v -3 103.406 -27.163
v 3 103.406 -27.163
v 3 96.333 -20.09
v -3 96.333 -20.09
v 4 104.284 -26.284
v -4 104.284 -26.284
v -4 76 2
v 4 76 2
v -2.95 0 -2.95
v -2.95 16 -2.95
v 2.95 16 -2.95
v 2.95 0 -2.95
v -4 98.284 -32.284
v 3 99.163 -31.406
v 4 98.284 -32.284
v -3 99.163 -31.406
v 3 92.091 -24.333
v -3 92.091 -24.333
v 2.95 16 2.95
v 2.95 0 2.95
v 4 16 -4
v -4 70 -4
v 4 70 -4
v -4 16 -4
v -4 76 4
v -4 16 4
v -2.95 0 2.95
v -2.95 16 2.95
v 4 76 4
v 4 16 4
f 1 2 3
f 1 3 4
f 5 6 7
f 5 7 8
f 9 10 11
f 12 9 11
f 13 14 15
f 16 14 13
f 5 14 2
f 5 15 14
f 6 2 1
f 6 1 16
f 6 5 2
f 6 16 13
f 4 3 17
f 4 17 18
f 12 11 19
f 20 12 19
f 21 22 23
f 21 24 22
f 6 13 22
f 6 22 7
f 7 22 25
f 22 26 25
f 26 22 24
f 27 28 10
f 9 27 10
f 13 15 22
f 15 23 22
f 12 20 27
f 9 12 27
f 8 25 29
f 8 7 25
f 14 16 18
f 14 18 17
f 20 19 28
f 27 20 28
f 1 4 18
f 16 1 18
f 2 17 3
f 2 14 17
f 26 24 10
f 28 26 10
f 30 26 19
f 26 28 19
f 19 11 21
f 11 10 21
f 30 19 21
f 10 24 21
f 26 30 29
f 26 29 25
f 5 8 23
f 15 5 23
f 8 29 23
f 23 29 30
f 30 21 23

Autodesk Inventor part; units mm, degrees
ref_plane "YZ Plane" through (0, 0, 0) normal (1, 0, 0) x (0, 1, 0)
ref_plane "XZ Plane" through (0, 0, 0) normal (0, 1, 0) x (-1, 0, 0)
ref_plane "XY Plane" through (0, 0, 0) normal (0, 0, 1) x (1, 0, 0)
sketch "Sketch1" plane through (0, 0, 0) normal (0, 1, 0) x (-1, 0, 0)
  line L0 (-2.95, 2.95) -> (2.95, 2.95)
  line L1 (2.95, 2.95) -> (2.95, -2.95)
  line L2 (2.95, -2.95) -> (-2.95, -2.95)
  line L3 (-2.95, -2.95) -> (-2.95, 2.95)
  line L4 (-2.95, 2.95) -> (2.95, -2.95) construction
  line L5 (2.95, 2.95) -> (-2.95, -2.95) construction
  point P0 (0, 0)
  dimension "d0" = 5.9
  dimension "d1" = 5.9
extrude "Extrusion1" add sketch "Sketch1" along normal blind 16
sketch "Sketch2" plane through (0, 16, 0) normal (0, 1, 0) x (1, 0, 0)
  line L0 (4, -4) -> (-4, -4)
  line L1 (-4, -4) -> (-4, 4)
  line L2 (-4, 4) -> (4, 4)
  line L3 (4, 4) -> (4, -4)
  line L4 (4, -4) -> (-4, 4) construction
  line L5 (-4, -4) -> (4, 4) construction
  point P0 (0, 0)
  dimension "d4" = 8
  dimension "d5" = 8
extrude "Extrusion2" add sketch "Sketch2" along normal blind 60
chamfer "Chamfer1" distance 6 angle 45 1 edges at (0, 76, -4) measured on face at (1.3333, 76, 1.3333)
sketch "Sketch4" plane through (4, 76, 2) normal (0, 0.7071, -0.7071) x (-1, 0, 0)
  line L0 (8, -8.4853) -> (8, 0) projected
  line L1 (8, 0) -> (0, 0) projected
  line L2 (0, 0) -> (0, -8.4853) projected
  line L3 (0, -8.4853) -> (8, -8.4853) projected
  point P0 (4, -55.1543)
extrude "Extrusion4" add sketch "Sketch4" along normal blind 40
sketch "Sketch5" plane through (4, 104.2843, -26.2843) normal (0, 0.7071, -0.7071) x (-1, 0, 0)
  line L0 (8, -8.4853) -> (8, 0) projected
  line L1 (8, 0) -> (0, 0) projected
  line L2 (0, 0) -> (0, -8.4853) projected
  line L3 (0, -8.4853) -> (8, -8.4853) projected
  line L4 (7, -7.2426) -> (1, -7.2426)
  line L5 (1, -7.2426) -> (1, -1.2426)
  line L6 (1, -1.2426) -> (7, -1.2426)
  line L7 (7, -1.2426) -> (7, -7.2426)
  line L8 (7, -7.2426) -> (1, -1.2426) construction
  line L9 (1, -7.2426) -> (7, -1.2426) construction
  point P0 (4, -55.1543)
  point P1 (4, -4.2426)
  dimension "d15" = 6
  dimension "d16" = 6
extrude "Extrusion5" cut sketch "Sketch5" against normal blind 10 contours L4 L5 L6 L7
properties part number "Stalk"
